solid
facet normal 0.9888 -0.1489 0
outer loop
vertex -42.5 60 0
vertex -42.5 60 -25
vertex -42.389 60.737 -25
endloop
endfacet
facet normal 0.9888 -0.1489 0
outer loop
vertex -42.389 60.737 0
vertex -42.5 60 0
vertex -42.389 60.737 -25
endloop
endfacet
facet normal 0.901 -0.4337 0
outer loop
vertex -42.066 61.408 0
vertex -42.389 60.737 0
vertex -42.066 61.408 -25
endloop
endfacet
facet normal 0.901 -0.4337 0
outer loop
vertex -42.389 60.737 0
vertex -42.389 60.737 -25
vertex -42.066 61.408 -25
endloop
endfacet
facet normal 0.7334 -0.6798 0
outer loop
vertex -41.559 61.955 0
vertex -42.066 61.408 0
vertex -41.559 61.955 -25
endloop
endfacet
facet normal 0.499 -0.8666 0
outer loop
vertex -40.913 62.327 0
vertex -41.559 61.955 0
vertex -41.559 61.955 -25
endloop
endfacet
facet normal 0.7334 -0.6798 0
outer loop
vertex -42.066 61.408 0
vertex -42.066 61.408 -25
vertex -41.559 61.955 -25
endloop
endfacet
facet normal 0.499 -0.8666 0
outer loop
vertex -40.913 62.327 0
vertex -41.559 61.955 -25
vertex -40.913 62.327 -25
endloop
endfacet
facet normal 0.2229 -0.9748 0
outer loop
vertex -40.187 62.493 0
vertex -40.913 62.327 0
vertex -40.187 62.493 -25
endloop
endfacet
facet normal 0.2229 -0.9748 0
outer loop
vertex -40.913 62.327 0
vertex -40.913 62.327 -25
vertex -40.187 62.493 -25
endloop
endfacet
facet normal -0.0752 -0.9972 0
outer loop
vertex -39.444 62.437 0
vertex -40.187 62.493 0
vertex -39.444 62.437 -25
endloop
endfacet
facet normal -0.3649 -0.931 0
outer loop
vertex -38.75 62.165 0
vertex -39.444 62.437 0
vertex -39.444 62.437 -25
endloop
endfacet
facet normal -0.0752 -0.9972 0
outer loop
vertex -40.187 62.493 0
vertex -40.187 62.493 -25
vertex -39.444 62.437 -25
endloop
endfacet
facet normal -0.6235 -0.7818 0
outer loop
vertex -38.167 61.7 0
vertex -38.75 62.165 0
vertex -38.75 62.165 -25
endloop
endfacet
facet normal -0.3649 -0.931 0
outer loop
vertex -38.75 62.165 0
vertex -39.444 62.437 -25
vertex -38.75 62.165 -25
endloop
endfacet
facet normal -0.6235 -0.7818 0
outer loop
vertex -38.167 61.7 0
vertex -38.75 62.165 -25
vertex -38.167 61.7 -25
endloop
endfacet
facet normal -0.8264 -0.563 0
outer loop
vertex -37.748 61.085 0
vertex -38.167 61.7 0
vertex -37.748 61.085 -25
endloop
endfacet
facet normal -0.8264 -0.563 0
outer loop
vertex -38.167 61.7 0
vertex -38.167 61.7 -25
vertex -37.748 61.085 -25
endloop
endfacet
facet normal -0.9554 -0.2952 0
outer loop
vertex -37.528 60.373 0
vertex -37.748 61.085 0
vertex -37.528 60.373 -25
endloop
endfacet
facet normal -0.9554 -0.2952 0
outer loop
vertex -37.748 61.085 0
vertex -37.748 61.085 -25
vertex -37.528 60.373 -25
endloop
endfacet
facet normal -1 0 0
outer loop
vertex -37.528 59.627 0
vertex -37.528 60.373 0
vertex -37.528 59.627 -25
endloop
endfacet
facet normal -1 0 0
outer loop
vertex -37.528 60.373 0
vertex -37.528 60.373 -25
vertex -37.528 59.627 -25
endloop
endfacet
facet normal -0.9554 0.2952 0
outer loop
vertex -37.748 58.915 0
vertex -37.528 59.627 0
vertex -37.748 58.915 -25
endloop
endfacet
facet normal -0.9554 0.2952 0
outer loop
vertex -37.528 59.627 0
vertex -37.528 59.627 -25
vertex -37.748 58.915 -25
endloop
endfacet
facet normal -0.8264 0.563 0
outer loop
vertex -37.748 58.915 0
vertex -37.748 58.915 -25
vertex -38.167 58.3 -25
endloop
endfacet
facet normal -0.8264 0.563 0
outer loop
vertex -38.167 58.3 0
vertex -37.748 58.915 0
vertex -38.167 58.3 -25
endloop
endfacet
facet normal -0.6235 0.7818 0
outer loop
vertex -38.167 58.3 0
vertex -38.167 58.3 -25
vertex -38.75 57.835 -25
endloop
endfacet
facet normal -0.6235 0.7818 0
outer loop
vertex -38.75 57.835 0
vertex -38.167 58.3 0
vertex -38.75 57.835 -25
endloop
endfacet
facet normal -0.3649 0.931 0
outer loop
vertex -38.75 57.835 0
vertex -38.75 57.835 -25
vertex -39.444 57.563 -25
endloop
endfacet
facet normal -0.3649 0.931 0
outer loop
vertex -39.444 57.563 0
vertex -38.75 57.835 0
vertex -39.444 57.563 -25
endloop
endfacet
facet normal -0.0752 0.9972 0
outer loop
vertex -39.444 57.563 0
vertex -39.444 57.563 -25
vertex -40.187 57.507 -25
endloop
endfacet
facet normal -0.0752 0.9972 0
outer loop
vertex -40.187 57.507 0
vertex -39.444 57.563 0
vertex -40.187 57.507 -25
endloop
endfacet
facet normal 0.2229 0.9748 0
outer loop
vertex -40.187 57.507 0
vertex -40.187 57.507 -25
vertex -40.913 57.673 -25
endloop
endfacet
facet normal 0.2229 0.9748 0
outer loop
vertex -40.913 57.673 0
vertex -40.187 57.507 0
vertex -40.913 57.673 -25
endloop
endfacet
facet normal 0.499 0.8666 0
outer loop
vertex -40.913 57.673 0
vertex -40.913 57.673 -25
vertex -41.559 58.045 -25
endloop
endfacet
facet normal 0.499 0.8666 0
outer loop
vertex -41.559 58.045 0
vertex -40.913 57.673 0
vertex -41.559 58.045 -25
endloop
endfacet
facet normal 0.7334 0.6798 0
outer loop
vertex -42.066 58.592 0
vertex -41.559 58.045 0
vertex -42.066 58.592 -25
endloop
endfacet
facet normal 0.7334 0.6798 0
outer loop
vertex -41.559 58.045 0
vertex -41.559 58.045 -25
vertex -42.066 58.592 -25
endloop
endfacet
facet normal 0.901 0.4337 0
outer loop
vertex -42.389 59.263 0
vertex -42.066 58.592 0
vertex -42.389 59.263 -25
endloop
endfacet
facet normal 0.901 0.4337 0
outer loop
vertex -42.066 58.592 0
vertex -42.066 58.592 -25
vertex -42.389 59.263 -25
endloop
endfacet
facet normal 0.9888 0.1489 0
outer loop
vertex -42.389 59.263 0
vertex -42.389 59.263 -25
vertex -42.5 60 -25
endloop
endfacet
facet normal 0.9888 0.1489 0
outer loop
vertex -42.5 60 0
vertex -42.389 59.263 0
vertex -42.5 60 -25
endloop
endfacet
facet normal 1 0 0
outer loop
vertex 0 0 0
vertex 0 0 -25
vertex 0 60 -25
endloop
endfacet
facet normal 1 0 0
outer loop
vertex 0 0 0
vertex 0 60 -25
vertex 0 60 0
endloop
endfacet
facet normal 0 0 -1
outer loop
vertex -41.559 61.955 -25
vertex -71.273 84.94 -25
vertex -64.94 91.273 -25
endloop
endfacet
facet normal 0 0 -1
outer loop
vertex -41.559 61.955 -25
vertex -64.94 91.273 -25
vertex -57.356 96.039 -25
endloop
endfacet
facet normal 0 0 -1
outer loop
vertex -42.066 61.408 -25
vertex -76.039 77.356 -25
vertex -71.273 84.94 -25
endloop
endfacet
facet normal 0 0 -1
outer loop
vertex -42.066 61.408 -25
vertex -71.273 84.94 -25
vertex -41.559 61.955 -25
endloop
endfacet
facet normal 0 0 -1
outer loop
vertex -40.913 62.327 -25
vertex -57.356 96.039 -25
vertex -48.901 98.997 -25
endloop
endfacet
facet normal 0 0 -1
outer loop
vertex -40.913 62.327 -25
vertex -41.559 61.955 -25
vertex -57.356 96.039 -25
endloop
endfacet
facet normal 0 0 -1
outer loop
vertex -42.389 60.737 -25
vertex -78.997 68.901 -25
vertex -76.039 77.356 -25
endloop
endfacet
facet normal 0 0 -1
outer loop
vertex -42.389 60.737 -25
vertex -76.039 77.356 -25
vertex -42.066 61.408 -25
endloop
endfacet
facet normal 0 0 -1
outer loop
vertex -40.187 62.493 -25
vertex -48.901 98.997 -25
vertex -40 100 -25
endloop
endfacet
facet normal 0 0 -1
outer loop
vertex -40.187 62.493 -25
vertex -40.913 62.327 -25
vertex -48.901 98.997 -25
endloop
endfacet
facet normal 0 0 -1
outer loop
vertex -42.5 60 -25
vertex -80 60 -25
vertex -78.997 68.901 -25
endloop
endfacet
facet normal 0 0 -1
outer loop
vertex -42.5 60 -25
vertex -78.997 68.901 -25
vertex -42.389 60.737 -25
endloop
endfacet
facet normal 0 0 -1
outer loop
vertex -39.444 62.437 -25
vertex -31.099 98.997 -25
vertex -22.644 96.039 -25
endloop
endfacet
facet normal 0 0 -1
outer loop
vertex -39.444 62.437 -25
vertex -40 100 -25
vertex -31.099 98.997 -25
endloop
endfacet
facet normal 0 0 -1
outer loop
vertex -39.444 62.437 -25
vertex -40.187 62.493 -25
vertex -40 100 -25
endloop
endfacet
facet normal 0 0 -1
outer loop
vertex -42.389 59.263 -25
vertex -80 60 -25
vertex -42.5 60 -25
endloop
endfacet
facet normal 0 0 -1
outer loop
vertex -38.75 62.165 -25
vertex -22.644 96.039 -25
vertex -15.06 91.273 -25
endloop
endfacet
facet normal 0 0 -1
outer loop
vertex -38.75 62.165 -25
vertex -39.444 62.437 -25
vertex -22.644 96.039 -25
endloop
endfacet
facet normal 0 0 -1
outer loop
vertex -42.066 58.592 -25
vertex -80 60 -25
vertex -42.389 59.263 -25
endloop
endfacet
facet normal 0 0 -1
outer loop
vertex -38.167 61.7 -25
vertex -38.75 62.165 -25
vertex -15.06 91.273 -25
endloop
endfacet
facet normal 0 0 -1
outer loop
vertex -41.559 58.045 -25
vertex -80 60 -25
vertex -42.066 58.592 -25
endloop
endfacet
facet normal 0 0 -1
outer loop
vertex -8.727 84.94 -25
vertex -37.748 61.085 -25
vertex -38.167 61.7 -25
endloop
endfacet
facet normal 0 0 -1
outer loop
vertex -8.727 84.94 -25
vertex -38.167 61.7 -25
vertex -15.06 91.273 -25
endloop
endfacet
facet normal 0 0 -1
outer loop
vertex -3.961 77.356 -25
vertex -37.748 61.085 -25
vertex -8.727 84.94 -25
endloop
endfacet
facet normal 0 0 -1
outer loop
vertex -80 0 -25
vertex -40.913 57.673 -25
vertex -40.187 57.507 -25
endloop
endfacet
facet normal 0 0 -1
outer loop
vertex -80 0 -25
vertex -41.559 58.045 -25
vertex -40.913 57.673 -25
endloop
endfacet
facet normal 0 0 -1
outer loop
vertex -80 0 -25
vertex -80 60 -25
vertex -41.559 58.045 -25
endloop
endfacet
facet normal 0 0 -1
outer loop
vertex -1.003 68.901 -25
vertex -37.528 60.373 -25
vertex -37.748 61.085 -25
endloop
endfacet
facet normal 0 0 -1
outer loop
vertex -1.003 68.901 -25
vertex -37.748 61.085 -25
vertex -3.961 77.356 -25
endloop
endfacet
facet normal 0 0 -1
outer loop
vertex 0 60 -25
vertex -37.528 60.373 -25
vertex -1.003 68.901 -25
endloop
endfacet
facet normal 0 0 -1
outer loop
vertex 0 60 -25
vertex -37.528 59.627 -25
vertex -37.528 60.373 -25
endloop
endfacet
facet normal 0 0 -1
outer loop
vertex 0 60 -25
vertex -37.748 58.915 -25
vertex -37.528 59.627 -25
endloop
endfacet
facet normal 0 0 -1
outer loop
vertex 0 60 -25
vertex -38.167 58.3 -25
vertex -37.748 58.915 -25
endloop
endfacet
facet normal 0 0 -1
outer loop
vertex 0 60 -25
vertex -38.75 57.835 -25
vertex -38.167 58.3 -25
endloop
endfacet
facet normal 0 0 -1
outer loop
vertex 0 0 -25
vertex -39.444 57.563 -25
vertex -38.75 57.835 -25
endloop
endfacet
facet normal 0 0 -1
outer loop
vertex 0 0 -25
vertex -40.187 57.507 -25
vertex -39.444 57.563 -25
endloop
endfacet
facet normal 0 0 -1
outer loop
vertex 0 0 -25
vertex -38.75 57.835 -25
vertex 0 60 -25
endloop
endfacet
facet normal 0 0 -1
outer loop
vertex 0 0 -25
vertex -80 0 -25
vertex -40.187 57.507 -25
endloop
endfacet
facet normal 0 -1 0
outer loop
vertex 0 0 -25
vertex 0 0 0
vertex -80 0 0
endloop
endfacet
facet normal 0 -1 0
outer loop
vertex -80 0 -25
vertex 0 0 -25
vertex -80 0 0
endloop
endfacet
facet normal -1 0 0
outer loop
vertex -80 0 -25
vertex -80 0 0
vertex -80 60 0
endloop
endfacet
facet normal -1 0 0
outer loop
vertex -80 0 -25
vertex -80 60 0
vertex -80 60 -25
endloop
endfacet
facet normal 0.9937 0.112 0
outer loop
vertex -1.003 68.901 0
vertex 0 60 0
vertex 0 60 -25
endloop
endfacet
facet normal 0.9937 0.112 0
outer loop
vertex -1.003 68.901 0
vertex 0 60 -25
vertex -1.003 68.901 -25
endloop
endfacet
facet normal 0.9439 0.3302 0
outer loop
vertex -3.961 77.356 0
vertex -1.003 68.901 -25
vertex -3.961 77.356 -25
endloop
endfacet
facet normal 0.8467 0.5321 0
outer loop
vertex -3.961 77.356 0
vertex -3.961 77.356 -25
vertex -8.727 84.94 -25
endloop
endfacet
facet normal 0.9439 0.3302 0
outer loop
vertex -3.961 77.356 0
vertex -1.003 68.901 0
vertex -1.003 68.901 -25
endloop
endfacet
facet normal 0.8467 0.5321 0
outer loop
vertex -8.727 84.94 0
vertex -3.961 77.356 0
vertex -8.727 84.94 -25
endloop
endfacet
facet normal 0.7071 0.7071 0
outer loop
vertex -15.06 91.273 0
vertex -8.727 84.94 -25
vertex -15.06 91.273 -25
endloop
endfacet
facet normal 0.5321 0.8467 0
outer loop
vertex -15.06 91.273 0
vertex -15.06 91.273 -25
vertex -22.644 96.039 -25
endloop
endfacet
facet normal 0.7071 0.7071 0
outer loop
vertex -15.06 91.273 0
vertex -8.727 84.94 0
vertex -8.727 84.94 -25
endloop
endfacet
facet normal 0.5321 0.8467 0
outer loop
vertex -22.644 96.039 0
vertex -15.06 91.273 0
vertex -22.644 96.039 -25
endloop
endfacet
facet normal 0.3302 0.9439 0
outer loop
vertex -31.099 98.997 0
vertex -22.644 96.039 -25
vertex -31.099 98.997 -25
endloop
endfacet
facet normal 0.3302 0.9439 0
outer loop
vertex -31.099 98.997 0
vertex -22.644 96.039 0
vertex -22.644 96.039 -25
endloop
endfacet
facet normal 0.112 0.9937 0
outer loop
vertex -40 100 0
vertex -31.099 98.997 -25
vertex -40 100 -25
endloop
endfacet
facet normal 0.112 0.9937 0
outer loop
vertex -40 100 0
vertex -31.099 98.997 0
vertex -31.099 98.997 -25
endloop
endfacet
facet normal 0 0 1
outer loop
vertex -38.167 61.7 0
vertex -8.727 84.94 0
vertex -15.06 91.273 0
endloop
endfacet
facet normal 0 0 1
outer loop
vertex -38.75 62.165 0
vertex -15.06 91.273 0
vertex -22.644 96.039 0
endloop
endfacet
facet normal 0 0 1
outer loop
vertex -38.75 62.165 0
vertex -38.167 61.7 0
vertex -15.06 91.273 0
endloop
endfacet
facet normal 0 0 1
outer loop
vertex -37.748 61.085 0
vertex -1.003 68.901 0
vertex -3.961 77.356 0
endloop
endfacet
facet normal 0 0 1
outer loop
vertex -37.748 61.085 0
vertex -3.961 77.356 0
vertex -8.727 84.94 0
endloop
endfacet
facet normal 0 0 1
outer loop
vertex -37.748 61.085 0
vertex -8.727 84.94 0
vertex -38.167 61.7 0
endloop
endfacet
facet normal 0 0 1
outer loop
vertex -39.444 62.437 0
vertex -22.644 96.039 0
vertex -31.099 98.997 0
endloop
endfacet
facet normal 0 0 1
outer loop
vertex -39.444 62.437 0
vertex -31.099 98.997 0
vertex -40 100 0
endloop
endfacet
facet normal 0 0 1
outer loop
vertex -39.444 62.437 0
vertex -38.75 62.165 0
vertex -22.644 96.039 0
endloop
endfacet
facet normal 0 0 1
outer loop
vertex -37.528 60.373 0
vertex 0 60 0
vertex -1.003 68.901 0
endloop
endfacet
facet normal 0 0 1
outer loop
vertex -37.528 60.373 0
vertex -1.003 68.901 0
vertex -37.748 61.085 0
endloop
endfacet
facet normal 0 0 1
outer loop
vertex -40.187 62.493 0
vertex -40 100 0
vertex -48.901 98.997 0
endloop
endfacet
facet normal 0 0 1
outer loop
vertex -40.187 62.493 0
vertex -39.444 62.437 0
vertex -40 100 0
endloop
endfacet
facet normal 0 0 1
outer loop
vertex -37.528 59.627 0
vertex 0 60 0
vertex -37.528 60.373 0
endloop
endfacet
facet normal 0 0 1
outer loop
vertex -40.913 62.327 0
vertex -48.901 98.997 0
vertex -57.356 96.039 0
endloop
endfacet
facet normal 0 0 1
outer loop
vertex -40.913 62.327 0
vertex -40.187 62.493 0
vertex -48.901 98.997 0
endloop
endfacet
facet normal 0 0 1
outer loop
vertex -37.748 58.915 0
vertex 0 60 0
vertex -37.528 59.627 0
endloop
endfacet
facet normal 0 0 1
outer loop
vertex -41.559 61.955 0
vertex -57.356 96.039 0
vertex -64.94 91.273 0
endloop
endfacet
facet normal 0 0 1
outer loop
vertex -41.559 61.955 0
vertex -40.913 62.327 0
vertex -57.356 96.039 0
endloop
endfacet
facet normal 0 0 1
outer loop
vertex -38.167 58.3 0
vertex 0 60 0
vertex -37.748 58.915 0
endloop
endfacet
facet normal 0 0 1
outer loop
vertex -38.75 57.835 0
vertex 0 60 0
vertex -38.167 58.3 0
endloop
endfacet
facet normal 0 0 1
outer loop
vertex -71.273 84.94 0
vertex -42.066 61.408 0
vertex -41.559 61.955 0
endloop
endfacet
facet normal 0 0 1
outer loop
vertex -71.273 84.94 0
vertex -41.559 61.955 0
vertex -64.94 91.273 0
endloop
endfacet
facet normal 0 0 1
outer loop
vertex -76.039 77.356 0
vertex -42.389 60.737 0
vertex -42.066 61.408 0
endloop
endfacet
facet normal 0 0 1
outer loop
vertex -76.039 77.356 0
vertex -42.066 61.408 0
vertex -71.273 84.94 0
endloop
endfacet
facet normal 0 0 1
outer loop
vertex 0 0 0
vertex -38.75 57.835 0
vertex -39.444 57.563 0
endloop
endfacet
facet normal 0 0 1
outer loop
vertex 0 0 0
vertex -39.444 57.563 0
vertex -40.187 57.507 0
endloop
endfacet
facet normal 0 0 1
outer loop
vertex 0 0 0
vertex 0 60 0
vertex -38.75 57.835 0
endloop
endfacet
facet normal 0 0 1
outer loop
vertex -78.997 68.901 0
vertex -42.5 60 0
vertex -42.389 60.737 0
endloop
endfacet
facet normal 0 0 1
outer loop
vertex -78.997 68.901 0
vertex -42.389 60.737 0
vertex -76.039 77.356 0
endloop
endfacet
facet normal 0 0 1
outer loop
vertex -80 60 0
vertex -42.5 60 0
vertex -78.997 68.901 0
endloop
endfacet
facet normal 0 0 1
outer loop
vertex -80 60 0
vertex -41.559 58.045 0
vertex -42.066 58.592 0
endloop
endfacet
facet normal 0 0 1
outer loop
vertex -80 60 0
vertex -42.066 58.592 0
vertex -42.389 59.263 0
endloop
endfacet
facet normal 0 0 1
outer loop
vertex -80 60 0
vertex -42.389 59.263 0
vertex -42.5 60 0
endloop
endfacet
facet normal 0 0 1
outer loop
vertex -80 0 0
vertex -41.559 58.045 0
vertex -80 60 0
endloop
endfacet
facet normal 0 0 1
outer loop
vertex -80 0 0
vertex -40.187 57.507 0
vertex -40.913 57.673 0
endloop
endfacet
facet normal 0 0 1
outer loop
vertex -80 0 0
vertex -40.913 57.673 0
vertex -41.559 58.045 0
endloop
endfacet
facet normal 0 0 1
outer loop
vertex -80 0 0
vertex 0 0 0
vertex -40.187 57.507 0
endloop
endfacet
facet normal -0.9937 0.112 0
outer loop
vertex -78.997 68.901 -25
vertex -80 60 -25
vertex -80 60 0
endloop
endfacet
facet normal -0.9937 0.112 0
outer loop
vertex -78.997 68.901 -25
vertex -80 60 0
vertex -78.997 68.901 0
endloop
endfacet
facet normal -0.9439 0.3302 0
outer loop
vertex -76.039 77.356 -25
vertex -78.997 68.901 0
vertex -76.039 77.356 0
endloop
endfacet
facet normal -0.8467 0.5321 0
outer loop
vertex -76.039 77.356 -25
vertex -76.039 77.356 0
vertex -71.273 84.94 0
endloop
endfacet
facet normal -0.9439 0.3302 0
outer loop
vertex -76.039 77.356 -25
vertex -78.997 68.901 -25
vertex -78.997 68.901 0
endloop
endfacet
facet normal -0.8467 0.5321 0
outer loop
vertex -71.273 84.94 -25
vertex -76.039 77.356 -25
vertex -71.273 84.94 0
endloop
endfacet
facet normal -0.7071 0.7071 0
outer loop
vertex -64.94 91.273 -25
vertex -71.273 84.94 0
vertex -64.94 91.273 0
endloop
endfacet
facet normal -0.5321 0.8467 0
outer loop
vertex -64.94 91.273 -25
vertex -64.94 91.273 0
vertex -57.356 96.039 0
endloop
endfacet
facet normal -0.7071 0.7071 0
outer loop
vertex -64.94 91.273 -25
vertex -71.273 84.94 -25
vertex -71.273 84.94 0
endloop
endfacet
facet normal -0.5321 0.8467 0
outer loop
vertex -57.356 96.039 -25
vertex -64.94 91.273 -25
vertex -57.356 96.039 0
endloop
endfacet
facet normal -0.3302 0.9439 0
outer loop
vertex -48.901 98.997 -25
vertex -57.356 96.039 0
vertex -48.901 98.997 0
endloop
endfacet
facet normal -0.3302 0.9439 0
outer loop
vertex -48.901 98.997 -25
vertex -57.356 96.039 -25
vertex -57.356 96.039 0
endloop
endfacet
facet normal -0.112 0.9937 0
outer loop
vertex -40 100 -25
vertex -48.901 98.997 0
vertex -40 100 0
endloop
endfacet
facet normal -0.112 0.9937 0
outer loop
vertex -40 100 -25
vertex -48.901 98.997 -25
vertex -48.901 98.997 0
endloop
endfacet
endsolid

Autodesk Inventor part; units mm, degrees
ref_plane "YZ Plane" through (0, 0, 0) normal (1, 0, 0) x (0, 1, 0)
ref_plane "XZ Plane" through (0, 0, 0) normal (0, 1, 0) x (-1, 0, 0)
ref_plane "XY Plane" through (0, 0, 0) normal (0, 0, 1) x (1, 0, 0)
sketch "Sketch1" plane through (0, 0, 0) normal (0, 1, 0) x (-1, 0, 0)
  line L0 (0, 0) -> (80, 0)
  line L1 (80, 0) -> (80, -25)
  line L2 (80, -25) -> (0, -25)
  line L3 (0, -25) -> (0, 0)
  dimension "d0" = 80
  dimension "d1" = 25
extrude "Extrusion1" add sketch "Sketch1" along normal blind 100
fillet "Fillet1" radius 40 2 edges at (0, 100, -12.5) (-80, 100, -12.5)
sketch "Sketch2" plane through (0, 0, -25) normal (0, 0, -1) x (-1, 0, 0)
  arc A0 (80, 60) -> (0, 60) centre (40, 60) ccw projected
  circle A1 centre (40, 60) radius 2.5
  point P0 (0, 0)
  dimension "d5" = 5
extrude "Extrusion2" cut sketch "Sketch2" against normal blind 100
properties part number "Foot"
